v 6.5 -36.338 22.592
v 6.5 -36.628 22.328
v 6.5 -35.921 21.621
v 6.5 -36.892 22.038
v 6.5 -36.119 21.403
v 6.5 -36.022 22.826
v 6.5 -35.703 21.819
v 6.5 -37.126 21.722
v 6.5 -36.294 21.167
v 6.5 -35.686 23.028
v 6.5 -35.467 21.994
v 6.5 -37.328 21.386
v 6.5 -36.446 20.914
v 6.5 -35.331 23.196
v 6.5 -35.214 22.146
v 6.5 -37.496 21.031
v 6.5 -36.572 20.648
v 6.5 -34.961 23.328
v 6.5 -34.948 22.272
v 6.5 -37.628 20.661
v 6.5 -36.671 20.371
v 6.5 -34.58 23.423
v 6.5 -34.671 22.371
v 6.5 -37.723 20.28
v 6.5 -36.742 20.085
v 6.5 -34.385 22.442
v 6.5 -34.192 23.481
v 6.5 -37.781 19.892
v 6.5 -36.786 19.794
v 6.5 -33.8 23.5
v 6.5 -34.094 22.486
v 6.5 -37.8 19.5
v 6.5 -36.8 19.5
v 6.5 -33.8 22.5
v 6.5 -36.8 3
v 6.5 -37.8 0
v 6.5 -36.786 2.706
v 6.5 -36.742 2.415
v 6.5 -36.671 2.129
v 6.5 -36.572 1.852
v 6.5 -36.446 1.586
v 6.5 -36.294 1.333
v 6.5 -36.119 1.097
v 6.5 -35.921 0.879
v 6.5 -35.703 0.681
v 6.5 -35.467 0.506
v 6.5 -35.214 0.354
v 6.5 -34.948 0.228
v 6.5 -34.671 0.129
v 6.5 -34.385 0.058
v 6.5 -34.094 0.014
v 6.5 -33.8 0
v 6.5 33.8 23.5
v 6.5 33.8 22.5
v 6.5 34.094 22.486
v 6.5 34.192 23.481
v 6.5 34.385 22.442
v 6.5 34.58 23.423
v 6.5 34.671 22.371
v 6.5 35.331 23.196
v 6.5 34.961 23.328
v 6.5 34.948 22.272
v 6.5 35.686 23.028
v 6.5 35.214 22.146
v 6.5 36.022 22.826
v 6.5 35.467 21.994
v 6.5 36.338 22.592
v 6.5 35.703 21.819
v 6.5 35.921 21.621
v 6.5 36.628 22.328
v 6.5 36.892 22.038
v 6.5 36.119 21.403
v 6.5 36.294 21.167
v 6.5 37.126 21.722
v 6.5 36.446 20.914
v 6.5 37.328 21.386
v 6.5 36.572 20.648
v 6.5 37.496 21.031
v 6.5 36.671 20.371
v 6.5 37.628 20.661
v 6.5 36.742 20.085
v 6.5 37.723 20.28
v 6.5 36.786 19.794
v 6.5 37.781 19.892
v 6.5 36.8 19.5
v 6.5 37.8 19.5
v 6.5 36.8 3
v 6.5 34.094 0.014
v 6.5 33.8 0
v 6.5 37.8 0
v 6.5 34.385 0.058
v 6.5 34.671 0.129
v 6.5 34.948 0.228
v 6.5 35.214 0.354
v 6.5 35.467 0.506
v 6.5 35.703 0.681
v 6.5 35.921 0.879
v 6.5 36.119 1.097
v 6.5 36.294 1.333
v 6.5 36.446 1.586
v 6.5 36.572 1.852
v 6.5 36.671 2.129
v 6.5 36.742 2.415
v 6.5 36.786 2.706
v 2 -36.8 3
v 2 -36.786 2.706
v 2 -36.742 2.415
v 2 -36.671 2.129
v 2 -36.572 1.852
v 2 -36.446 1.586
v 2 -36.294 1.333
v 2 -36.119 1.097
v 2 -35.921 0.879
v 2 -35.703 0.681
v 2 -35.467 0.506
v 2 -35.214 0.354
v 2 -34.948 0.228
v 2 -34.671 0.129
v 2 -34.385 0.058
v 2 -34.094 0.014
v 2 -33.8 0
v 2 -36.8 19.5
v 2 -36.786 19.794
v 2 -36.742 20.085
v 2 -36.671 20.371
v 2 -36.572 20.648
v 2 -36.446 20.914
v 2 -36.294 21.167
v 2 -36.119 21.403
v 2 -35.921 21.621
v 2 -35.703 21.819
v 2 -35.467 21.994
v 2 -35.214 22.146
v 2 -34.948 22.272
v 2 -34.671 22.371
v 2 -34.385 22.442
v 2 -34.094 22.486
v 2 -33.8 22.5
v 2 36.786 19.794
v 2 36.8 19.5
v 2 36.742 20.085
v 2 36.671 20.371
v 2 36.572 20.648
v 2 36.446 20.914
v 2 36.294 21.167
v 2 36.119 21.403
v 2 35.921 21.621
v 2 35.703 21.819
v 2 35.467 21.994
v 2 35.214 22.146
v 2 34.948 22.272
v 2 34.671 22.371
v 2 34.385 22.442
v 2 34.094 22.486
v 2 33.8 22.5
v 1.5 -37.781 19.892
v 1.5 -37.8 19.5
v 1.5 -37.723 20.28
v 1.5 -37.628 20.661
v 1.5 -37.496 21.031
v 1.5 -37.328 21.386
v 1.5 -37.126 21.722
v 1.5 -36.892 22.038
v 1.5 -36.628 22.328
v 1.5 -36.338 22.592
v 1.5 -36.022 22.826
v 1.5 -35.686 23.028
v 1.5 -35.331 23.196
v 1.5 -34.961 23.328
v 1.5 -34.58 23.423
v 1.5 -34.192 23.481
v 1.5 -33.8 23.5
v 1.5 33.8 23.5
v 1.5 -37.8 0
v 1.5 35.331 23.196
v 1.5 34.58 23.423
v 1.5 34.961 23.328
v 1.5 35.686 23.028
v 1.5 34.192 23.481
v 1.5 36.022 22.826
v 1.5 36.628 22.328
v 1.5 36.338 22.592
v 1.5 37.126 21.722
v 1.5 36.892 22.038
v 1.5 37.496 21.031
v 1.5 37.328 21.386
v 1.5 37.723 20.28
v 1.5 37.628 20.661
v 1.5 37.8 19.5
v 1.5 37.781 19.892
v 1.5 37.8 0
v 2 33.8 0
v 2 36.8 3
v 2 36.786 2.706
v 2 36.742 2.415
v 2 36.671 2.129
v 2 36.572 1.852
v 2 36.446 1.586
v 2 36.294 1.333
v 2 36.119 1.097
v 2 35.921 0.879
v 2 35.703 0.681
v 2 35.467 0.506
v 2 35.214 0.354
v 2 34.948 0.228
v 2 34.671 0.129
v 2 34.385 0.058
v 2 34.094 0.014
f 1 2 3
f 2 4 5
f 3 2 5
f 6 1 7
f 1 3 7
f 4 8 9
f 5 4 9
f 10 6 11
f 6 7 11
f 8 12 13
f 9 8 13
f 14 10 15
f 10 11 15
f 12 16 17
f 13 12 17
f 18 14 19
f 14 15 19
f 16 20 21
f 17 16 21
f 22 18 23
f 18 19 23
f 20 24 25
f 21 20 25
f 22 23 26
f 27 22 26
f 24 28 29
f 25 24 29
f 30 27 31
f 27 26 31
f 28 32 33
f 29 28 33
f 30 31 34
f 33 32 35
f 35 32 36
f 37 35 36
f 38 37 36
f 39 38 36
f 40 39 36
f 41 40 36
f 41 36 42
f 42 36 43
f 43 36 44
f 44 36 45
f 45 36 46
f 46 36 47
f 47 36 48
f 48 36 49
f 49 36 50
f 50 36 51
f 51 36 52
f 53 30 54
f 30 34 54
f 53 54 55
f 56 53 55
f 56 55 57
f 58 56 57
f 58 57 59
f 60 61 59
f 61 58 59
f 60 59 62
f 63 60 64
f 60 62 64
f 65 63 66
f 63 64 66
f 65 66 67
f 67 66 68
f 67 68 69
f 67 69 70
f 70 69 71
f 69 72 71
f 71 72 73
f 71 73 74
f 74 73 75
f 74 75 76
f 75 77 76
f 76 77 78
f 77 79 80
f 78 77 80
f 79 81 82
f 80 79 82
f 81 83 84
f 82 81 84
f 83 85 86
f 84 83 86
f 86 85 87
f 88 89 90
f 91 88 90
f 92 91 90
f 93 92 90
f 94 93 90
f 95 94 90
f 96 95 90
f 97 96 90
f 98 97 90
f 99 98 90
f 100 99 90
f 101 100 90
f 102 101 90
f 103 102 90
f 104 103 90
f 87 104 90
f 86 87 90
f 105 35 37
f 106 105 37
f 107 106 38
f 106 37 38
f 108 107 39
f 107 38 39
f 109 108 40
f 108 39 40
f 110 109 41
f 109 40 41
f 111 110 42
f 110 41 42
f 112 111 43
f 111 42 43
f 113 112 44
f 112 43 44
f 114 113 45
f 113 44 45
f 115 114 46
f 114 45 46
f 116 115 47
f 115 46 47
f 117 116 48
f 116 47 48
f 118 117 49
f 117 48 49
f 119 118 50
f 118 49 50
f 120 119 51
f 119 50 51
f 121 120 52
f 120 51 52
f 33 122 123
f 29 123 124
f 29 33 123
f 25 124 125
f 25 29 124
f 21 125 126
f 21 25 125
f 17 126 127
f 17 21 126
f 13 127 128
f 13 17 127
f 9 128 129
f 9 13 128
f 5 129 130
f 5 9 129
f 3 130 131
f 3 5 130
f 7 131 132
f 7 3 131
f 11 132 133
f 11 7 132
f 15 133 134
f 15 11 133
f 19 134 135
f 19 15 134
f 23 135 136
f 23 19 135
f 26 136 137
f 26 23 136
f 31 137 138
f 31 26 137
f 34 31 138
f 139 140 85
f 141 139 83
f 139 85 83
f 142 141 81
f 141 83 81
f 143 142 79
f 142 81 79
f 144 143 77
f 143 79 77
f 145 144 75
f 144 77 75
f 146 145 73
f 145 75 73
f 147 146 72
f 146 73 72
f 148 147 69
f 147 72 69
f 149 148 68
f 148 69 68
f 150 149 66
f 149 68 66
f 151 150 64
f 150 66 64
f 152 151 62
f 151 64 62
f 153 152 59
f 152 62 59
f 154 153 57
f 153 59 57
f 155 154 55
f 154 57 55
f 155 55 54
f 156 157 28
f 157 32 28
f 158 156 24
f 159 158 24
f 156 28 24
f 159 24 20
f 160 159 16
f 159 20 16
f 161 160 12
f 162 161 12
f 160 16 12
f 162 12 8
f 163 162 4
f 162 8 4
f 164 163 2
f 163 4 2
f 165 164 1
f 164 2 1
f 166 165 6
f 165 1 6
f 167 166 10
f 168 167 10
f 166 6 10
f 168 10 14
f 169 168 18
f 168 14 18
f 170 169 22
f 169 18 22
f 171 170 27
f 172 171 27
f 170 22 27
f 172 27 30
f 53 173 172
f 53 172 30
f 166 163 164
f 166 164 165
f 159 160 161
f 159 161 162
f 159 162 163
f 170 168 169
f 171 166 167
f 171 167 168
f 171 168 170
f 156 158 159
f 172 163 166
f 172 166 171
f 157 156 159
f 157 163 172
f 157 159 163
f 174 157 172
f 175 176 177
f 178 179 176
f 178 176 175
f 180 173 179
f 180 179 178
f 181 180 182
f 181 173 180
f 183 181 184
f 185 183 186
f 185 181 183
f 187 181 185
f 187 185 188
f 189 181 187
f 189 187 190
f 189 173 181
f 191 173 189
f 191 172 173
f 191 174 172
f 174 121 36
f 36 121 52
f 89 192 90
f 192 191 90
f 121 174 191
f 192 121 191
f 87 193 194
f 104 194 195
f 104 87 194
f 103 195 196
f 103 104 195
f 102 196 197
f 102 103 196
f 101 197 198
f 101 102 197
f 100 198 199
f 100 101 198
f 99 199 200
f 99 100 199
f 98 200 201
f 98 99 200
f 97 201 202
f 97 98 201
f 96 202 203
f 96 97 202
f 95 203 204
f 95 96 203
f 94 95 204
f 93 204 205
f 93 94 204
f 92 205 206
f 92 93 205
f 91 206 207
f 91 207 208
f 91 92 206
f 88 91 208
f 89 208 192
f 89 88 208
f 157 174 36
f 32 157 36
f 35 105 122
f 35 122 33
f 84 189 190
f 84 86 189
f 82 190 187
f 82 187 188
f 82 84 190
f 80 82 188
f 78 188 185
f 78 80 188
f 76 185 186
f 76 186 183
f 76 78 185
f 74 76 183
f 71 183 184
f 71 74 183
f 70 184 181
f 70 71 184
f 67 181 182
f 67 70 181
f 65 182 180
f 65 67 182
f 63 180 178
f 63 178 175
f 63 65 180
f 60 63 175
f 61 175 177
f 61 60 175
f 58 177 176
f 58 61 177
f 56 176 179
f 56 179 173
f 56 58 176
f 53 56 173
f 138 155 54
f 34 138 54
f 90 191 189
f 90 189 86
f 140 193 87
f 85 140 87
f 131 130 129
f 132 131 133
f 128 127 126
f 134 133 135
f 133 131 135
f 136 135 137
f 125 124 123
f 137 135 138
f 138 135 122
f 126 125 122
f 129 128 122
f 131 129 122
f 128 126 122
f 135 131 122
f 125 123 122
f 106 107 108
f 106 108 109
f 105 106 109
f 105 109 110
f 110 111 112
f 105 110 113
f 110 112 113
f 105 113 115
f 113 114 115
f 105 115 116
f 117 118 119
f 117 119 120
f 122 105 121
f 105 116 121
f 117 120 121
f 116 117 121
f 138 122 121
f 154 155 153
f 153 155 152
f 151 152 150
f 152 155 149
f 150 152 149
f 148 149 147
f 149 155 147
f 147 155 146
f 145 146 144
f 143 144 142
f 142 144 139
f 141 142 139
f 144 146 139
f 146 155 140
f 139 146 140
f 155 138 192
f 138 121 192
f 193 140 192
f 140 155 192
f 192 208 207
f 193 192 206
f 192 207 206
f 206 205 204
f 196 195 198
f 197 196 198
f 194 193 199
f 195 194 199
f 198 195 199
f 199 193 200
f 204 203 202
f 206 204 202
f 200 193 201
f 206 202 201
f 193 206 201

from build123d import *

# Parameters (mm, degrees)
BOX_W        = 141
BOX_H        = 73.6
BOX_DEPTH    = 22.5
FILLET_R     = 3
BOX004_W     = 5
BOX004_H     = 75.6
BOX004_DEPTH = 23.5
FILLET004_R  = 4


with BuildPart() as battery_fillet:
    # Box → Box (new body)
    with BuildSketch(Plane(origin=(2, 0, 0), x_dir=(1, 0, 0), z_dir=(0, 0, 1))):
        with Locations((70.5, 36.8)):
            Rectangle(BOX_W, BOX_H)
    extrude(amount=BOX_DEPTH)

    # Fillet
    fillet_edges = [battery_fillet.edges().sort_by_distance(p)[0] for p in [
        (72.5, 0, 0),
        (72.5, 0, 22.5),
        (72.5, 73.6, 0),
        (72.5, 73.6, 22.5),
    ]]
    fillet(fillet_edges, radius=FILLET_R)


with BuildPart() as battery_fillet_1:
    # Fillet placement: moved
    add(battery_fillet.part.moved(Location((0, -36.8, 0))))


with BuildPart() as test_back_wall_cut:
    # Box004 → Box004 (new body)
    with BuildSketch(Plane(origin=(1.5, -37.8, 0), x_dir=(1, 0, 0), z_dir=(0, 0, 1))):
        with Locations((2.5, 37.8)):
            Rectangle(BOX004_W, BOX004_H)
    extrude(amount=BOX004_DEPTH)

    # Fillet004
    fillet004_edges = [test_back_wall_cut.edges().sort_by_distance(p)[0] for p in [
        (4, -37.8, 23.5),
        (4, 37.8, 23.5),
    ]]
    fillet(fillet004_edges, radius=FILLET004_R)

    # Cut003: cut battery fillet
    add(battery_fillet_1.part, mode=Mode.SUBTRACT)


solid = test_back_wall_cut.part
